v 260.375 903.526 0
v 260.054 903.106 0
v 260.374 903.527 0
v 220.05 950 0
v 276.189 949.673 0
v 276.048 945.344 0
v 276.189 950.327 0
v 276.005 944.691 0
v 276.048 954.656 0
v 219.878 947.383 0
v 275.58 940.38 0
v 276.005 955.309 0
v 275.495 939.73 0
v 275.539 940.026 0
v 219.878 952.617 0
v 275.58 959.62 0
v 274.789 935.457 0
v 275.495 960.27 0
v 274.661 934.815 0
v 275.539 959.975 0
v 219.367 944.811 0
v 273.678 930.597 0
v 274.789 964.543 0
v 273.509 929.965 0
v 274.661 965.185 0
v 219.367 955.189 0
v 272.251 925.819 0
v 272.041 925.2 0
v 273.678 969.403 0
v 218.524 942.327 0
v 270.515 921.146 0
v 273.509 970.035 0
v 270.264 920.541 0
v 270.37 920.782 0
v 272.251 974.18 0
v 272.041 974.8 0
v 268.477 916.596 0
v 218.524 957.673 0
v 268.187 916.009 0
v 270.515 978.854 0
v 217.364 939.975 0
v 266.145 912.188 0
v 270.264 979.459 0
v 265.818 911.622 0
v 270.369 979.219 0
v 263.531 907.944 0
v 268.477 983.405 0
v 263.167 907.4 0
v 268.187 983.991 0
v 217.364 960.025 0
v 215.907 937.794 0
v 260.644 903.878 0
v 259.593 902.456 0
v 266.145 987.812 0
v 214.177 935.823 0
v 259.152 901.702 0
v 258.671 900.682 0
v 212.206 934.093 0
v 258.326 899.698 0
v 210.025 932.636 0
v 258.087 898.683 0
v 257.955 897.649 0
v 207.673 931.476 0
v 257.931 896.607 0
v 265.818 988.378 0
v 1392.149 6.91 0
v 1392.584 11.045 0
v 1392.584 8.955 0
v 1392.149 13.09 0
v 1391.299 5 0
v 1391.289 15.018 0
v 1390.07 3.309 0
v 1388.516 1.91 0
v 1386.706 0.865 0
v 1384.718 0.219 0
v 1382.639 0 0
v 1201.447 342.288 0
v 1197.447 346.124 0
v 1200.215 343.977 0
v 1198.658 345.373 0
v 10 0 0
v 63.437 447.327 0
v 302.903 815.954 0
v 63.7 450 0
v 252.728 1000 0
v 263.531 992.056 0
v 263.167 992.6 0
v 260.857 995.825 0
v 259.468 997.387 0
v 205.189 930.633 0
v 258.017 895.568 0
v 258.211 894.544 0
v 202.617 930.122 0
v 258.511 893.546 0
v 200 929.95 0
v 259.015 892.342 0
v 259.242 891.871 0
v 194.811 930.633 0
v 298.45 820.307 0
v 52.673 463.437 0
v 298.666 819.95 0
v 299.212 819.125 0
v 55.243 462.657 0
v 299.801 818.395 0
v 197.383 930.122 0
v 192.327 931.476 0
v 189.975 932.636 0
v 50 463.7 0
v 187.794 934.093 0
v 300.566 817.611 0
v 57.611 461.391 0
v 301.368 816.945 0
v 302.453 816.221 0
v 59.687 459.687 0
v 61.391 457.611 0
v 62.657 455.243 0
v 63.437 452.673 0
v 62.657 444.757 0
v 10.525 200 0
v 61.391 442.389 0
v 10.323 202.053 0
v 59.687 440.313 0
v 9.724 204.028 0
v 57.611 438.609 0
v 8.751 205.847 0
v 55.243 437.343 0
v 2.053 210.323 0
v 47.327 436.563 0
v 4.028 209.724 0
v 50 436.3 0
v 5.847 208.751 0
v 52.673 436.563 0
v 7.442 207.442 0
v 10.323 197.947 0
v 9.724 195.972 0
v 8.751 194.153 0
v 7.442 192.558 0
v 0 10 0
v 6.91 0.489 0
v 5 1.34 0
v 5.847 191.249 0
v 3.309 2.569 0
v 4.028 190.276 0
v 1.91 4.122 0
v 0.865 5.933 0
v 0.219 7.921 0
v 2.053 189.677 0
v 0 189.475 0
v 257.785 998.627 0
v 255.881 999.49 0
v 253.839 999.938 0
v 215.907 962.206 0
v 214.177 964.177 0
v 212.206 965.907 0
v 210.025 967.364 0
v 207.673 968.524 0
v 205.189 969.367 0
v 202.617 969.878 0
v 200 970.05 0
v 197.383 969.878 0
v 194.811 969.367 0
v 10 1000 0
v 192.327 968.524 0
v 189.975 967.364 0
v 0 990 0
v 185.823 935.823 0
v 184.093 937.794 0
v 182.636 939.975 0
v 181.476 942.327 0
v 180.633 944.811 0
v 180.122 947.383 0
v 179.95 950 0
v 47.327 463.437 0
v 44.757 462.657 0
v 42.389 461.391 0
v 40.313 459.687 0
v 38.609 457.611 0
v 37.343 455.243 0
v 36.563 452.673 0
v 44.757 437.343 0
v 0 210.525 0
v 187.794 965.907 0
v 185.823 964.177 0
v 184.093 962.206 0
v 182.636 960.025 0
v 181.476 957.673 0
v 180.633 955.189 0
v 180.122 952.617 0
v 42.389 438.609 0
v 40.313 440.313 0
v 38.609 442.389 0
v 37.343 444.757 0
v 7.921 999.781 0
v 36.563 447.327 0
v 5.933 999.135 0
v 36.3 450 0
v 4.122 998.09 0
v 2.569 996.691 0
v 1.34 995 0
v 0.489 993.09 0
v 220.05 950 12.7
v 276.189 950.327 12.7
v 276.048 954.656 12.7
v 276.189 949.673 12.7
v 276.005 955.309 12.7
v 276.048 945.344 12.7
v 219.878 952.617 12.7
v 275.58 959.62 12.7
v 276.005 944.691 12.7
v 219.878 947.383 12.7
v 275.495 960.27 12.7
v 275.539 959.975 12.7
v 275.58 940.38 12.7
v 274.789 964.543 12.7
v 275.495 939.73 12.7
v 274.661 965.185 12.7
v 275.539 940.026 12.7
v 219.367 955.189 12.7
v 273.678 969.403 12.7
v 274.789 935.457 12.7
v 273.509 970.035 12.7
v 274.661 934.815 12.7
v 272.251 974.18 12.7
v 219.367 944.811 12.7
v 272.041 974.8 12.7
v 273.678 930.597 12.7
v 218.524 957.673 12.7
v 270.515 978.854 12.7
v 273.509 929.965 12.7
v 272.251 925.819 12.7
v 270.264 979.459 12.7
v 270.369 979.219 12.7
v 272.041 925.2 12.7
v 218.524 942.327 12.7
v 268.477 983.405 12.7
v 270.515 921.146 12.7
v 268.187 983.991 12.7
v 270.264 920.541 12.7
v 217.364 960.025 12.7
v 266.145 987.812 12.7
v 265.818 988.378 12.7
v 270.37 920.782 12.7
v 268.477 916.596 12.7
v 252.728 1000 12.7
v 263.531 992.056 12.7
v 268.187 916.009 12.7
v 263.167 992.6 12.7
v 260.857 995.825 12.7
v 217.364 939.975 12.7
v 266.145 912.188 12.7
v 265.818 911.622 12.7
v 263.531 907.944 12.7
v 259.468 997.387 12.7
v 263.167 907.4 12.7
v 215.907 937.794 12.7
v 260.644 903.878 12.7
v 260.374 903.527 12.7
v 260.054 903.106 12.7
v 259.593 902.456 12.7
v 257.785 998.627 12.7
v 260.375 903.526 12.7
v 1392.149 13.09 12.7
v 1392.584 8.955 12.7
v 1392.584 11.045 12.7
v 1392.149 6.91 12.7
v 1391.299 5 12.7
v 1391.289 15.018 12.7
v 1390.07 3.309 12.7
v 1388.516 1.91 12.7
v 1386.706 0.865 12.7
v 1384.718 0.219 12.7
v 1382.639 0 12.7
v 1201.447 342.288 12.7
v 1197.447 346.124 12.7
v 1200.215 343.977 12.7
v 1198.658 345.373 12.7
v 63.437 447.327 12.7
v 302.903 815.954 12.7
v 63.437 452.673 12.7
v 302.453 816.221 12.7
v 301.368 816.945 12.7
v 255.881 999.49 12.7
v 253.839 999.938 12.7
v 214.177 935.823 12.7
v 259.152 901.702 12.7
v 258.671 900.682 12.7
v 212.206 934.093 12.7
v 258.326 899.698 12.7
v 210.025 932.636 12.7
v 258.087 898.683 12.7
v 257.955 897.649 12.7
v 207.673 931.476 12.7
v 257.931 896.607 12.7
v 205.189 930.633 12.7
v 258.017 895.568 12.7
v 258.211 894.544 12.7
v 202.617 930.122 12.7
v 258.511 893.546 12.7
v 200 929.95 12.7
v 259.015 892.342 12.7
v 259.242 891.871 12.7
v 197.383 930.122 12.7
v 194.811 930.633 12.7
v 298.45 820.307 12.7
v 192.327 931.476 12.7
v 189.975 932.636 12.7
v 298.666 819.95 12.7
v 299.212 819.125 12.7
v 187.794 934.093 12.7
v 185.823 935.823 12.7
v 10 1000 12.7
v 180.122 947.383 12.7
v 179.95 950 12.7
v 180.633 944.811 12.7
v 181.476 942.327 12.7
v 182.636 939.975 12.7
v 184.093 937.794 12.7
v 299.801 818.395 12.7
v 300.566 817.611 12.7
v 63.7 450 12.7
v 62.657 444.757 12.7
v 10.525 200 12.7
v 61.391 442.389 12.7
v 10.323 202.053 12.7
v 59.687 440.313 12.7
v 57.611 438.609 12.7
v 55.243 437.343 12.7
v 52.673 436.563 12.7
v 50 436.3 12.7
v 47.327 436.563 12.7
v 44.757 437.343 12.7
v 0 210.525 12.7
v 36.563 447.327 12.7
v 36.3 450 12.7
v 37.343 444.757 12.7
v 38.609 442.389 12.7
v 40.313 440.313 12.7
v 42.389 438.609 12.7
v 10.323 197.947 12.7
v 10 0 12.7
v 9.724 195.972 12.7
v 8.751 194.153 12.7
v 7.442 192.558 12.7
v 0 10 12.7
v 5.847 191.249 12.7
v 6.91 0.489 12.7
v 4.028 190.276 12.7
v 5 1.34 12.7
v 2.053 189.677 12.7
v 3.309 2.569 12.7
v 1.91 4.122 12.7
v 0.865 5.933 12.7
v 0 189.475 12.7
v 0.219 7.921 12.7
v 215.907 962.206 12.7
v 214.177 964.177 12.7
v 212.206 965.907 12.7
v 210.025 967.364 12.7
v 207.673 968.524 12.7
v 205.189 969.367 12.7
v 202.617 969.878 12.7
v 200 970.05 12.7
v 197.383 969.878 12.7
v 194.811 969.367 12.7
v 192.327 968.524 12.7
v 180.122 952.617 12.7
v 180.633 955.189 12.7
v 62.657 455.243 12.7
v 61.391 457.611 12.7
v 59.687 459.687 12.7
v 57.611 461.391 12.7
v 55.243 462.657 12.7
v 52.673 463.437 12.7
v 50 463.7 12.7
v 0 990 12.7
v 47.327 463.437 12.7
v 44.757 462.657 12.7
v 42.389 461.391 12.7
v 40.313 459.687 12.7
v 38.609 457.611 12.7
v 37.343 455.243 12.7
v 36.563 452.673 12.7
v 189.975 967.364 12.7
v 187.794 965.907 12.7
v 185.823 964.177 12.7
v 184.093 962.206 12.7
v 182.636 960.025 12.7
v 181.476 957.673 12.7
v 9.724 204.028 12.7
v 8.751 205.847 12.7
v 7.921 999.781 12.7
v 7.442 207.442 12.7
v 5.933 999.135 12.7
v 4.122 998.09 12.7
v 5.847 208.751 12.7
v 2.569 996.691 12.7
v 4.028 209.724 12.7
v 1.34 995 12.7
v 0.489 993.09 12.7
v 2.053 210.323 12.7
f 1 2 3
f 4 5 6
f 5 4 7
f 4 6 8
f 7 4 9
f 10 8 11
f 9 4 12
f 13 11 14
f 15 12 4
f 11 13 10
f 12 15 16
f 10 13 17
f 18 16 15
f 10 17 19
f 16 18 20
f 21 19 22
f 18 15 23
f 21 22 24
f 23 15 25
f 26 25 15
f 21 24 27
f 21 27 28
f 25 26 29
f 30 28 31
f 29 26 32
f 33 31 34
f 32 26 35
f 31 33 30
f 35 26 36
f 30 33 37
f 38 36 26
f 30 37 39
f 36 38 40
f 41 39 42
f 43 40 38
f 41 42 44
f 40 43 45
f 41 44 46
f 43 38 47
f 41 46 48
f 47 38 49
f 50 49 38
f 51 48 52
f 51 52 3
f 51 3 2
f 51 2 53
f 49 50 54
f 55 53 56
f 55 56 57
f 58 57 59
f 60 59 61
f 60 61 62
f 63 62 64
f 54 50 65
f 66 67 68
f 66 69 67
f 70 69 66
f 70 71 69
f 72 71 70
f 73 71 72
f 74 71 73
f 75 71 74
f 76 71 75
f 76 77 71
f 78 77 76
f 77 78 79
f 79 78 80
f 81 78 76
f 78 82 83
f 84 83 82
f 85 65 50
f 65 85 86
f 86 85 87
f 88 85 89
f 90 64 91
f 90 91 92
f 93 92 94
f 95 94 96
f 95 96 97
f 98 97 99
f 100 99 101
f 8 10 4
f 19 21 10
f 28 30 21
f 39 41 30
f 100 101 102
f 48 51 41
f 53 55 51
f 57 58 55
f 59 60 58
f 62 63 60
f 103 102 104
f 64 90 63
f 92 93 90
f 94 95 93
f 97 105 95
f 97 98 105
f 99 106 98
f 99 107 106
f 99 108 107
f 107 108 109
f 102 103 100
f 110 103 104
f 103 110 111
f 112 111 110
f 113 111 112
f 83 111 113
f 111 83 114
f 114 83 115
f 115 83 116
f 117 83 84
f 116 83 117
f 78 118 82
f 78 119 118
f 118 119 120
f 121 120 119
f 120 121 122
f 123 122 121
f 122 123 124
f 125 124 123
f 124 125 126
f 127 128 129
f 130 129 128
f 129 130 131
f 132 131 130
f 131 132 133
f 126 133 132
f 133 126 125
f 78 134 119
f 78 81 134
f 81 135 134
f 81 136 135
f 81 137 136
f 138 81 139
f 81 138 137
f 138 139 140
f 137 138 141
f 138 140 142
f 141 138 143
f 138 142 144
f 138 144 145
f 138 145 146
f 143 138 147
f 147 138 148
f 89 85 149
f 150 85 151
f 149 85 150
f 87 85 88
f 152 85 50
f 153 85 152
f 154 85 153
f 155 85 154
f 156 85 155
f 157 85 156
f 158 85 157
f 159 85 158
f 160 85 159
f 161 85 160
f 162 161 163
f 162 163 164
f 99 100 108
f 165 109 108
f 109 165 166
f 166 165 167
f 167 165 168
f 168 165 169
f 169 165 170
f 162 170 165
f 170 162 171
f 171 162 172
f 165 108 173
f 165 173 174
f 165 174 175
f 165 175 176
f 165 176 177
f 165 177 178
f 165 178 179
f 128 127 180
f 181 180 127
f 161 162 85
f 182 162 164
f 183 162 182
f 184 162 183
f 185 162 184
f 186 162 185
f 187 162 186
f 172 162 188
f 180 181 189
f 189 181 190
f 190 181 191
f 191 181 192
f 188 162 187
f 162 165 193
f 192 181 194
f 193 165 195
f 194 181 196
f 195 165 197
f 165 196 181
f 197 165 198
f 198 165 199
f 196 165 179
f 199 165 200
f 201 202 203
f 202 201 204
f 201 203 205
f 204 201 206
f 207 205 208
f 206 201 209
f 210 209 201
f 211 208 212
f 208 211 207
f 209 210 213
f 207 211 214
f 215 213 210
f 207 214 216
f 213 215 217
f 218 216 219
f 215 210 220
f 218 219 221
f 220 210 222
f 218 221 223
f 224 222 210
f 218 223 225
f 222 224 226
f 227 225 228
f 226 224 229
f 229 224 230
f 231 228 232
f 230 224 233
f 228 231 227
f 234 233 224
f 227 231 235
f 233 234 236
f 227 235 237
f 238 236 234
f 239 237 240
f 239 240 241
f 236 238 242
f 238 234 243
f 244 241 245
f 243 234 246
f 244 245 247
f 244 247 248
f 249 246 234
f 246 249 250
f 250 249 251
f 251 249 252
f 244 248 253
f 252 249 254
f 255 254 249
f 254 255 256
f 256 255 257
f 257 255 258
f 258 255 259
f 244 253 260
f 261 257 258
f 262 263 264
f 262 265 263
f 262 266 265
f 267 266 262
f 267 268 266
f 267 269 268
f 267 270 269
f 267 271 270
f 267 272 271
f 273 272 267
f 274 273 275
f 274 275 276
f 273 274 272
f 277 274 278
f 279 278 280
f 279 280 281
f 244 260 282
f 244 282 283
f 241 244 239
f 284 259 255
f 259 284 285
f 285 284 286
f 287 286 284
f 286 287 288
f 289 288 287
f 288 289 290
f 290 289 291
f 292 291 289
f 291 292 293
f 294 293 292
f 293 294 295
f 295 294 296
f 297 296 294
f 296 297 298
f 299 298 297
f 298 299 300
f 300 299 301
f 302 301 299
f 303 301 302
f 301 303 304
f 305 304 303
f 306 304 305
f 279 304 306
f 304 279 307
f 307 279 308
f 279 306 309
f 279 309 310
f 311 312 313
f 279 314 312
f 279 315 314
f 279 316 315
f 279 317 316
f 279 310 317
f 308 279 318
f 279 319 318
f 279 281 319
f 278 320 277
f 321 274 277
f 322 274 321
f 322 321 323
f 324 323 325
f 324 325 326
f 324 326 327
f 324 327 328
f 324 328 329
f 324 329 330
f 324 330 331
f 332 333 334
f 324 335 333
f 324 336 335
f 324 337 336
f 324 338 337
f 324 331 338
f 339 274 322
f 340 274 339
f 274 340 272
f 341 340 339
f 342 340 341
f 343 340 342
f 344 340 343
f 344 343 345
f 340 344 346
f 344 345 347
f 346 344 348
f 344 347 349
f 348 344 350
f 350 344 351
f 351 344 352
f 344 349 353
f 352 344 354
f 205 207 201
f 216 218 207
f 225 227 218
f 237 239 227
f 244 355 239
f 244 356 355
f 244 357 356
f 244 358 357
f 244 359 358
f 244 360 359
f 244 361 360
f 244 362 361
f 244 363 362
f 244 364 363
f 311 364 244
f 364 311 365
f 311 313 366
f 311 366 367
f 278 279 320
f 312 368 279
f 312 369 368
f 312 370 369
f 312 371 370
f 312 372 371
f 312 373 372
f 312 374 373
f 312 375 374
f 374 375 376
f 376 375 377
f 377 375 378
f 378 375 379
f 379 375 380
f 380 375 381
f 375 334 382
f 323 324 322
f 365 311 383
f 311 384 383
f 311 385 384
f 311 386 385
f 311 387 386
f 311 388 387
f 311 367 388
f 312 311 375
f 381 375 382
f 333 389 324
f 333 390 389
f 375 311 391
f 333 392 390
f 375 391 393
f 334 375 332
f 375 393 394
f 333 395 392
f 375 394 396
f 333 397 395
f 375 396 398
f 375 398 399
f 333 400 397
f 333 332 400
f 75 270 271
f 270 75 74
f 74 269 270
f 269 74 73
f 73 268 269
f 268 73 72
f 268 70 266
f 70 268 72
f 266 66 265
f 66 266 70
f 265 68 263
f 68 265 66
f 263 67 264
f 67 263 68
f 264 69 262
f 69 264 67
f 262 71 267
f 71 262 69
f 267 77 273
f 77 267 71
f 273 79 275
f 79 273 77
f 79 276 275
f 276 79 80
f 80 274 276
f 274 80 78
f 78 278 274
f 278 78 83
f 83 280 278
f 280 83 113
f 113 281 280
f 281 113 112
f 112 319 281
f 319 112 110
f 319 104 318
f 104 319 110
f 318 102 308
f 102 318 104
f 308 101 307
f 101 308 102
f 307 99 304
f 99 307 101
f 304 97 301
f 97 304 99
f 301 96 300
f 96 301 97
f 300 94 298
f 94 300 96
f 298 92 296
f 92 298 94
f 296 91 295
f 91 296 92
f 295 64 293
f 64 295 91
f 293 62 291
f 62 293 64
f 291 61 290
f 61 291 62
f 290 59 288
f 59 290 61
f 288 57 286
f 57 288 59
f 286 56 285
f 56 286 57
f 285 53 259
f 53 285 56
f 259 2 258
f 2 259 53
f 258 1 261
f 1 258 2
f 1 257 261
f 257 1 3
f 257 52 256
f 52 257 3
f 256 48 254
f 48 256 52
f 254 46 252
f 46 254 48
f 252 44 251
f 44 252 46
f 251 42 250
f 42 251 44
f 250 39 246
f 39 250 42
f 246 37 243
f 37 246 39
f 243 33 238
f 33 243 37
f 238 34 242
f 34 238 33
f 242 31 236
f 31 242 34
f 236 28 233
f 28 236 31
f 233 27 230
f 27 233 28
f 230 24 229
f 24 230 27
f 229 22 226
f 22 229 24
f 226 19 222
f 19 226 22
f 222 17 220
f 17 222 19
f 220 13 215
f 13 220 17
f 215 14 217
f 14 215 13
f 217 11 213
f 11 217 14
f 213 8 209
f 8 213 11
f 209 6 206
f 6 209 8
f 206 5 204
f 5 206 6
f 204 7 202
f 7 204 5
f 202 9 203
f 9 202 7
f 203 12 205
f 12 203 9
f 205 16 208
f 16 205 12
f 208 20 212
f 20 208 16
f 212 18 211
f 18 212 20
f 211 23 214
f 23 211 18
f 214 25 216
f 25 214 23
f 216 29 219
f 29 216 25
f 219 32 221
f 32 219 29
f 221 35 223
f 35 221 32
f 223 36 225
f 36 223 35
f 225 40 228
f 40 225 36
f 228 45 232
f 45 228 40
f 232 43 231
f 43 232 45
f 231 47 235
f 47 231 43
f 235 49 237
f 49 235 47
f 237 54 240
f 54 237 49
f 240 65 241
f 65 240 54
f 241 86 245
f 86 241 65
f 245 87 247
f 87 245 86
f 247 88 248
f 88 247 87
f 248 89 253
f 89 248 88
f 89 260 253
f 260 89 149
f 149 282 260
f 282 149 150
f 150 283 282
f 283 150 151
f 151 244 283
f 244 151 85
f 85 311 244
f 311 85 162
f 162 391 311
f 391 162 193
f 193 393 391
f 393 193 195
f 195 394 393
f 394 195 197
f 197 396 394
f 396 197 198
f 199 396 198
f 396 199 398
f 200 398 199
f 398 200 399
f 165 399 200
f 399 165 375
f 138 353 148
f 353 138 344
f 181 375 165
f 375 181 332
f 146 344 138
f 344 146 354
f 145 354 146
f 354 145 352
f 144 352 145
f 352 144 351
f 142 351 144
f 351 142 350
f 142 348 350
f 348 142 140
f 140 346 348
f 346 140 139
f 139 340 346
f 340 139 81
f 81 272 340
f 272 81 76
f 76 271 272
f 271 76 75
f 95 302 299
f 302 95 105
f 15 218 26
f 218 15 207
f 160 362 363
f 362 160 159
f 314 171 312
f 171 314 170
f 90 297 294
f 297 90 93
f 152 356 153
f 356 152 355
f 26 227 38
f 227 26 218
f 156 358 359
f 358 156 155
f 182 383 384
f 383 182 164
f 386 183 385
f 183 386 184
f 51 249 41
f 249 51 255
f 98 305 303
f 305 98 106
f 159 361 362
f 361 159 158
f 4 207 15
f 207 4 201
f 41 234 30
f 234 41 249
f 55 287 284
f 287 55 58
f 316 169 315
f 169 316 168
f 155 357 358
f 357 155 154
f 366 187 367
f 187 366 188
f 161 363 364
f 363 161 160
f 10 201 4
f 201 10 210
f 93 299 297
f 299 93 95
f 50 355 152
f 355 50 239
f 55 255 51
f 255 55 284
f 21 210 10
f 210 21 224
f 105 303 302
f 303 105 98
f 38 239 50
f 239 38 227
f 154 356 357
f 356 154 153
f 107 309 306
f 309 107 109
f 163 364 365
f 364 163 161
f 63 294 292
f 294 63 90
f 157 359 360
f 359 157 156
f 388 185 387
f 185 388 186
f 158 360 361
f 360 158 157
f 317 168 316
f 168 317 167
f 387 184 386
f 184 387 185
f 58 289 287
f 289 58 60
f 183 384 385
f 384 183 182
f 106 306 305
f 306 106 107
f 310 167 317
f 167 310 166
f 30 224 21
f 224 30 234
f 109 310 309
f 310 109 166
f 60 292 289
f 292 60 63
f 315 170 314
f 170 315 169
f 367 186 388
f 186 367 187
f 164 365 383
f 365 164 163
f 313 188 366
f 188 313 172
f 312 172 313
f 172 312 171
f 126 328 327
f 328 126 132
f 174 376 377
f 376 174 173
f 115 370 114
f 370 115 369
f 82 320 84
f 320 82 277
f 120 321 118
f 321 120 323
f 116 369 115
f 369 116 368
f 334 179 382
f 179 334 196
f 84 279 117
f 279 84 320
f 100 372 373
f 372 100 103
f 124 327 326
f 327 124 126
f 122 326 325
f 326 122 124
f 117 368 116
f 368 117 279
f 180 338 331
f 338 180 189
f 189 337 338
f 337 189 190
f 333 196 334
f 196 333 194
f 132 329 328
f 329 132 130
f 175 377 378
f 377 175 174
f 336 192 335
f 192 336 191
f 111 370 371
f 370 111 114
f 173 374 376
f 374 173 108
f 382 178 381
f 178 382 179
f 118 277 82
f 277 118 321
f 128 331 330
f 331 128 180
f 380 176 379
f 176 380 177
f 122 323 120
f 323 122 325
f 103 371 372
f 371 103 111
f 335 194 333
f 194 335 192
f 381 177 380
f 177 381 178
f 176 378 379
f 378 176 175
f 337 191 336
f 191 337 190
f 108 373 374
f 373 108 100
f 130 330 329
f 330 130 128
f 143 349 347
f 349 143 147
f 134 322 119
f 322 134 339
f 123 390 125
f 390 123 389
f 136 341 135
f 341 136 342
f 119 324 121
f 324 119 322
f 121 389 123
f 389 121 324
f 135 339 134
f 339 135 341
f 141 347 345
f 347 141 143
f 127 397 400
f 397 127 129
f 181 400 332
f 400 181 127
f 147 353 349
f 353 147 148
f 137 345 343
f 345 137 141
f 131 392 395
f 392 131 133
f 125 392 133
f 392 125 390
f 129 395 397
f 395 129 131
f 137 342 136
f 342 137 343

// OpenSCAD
// side_panel.scad
// Triangular side panel for LifeTrac v25
// This is the main structural plate that forms the sides of the machine
// Part of the "sandwich" design with 4 panels total (2 inner, 2 outer)

// Include necessary parameters from main assembly
include <../lifetrac_v25_params.scad>

// Triangular profile for side panels
// Tall end at rear (Y=0), shorter sloped end at front (Y=WHEEL_BASE)
module side_panel_profile() {
    // Calculate arm bottom slope line
    // Pivot point in panel coordinates
    pivot_y_panel = ARM_PIVOT_Y;
    pivot_z_panel = MACHINE_HEIGHT - 50;
    
    // Arm angle (ensure it's defined)
    arm_angle = is_undef(ARM_MIN_ANGLE) ? -45 : ARM_MIN_ANGLE;
    
    // Vertical offset to clear arm bottom (Half tube height + clearance)
    // Tube is 3" (76.2mm), half is 38.1mm. Add ~40mm clearance.
    arm_clearance_z = 80;
    
    // Function to calculate wall height at a given Y based on arm slope
    function wall_height(y) = 
        let(
            dy = y - pivot_y_panel,
            dz = dy * tan(arm_angle)
        )
        pivot_z_panel + dz - arm_clearance_z;

    // Define key Y coordinates
    y_rear = 0;
    y_pivot_start = pivot_y_panel - 100; // Start of pivot area
    y_pivot_end = pivot_y_panel + 100;   // End of pivot area (start of slope)
    y_front = WHEEL_BASE;                // Front of machine
    
    // Calculate Z heights
    z_pivot_end = wall_height(y_pivot_end);
    z_front_slope = wall_height(y_front - 200); // Point before final drop

    // The arm pivot pin pushes forward and up on this plate, toward the sloped edge.
    // The boss keeps 2 x the pin diameter of steel around the hole in that direction.
    // Above the hole, the top edge must be at least 1.25 x the pin diameter away
    // (the AISC minimum edge distance).
    assert(SIDE_PANEL_PIVOT_BOSS_R >= 2 * PIVOT_PIN_DIA,
           "SIDE_PANEL_PIVOT_BOSS_R must be at least 2 x PIVOT_PIN_DIA");
    assert(MACHINE_HEIGHT - pivot_z_panel >= 1.25 * PIVOT_PIN_DIA,
           "Arm pivot hole is too close to the top edge of the side panel");

    offset(r=10) offset(r=-10)  // Rounded corners
    offset(r=-10) offset(r=10)  // Fillets in the inside corners, e.g. where the boss meets the slope
    union() {
        polygon([
            [0, 0],                              // Rear bottom
            [WHEEL_BASE, 0],                     // Front bottom
            [WHEEL_BASE, 0],                     // Front top (drop to corner)
            [WHEEL_BASE - 200, z_front_slope],   // End of arm slope
            [y_pivot_end, z_pivot_end],          // Start of arm slope
            [pivot_y_panel, MACHINE_HEIGHT],     // Pivot high point
            [0, MACHINE_HEIGHT]                  // Rear top (full height)
        ]);

        // Pivot boss, trimmed to the top edge
        intersection() {
            translate([pivot_y_panel, pivot_z_panel])
                circle(r=SIDE_PANEL_PIVOT_BOSS_R, $fn=96);
            translate([pivot_y_panel - SIDE_PANEL_PIVOT_BOSS_R, 0])
                square([2 * SIDE_PANEL_PIVOT_BOSS_R, MACHINE_HEIGHT]);
        }
    }
}

// Arc slot cutout for cross beam clearance
// Creates an arc-shaped slot that allows the cross beam to rotate through
module cross_beam_arc_slot(beam_distance, slot_width) {
    // Pivot point in panel local coordinates
    pivot_x = PIVOT_PANEL_X;
    pivot_y = PIVOT_PANEL_Y;
    
    // Arc radius = distance from pivot to cross beam center
    arc_radius = beam_distance;
    
    // Half-width of the slot (beam size + clearance)
    half_slot = slot_width / 2;
    
    // Generate arc by rotating around pivot
    // The arc sweeps from ARM_MIN_ANGLE to ARM_MAX_ANGLE
    // We extend slightly beyond to ensure full clearance
    // Safety check for undefined angles
    safe_min_angle = is_undef(ARM_MIN_ANGLE) ? -45 : ARM_MIN_ANGLE;
    safe_max_angle = is_undef(ARM_MAX_ANGLE) ? 60 : ARM_MAX_ANGLE;
    
    arc_start = safe_min_angle - 5;
    arc_end = safe_max_angle + 5;
    arc_steps = 60;
    
    translate([pivot_x, pivot_y])
    for (i = [0:arc_steps-1]) {
        angle1 = arc_start + i * (arc_end - arc_start) / arc_steps;
        angle2 = arc_start + (i + 1) * (arc_end - arc_start) / arc_steps;
        
        // Inner and outer points for this arc segment
        hull() {
            // Point at angle1, inner radius
            translate([(arc_radius - half_slot) * cos(angle1), (arc_radius - half_slot) * sin(angle1)])
            circle(d=5, $fn=8);
            
            // Point at angle1, outer radius
            translate([(arc_radius + half_slot) * cos(angle1), (arc_radius + half_slot) * sin(angle1)])
            circle(d=5, $fn=8);
            
            // Point at angle2, inner radius
            translate([(arc_radius - half_slot) * cos(angle2), (arc_radius - half_slot) * sin(angle2)])
            circle(d=5, $fn=8);
            
            // Point at angle2, outer radius
            translate([(arc_radius + half_slot) * cos(angle2), (arc_radius + half_slot) * sin(angle2)])
            circle(d=5, $fn=8);
        }
    }
}

// Arc slot cutout for hydraulic bracket clearance
// Creates an arc-shaped divot with gusset profile that allows the arm's 
// hydraulic mounting extension to rotate through without collision
module hydraulic_bracket_arc_slot(bracket_pos, bracket_dia, clearance) {
    // Pivot point in panel local coordinates
    pivot_x = PIVOT_PANEL_X;
    pivot_y = PIVOT_PANEL_Y;
    
    // Bracket circle parameters
    circle_r = bracket_dia / 2;
    tube_h = is_undef(TUBE_2X6_1_4) ? 152.4 : TUBE_2X6_1_4[1];  // 6" tube height
    tube_w = is_undef(TUBE_2X6_1_4) ? 50.8 : TUBE_2X6_1_4[0];   // 2" tube width
    
    // Cutout depth - only 3" deep (not full bracket depth)
    cutout_depth = 76.2;  // 3 inches
    
    // Gusset attachment length (matching arm plate: 3x tube width)
    gusset_attach_len = tube_w * 3;
    
    // The cutout profile mirrors the arm plate extension but shallower
    // Circle center offset from arm axis (at tube bottom - cutout_depth/2)
    cutout_circle_r = cutout_depth / 2;
    
    // Offset perpendicular to arm axis (below the arm)
    perp_offset = tube_h/2 + cutout_circle_r;
    
    // Total cutout radius (half of cutout depth + clearance)
    cutout_r = cutout_circle_r + clearance;
    
    // Half of gusset attachment (for the triangular profile)
    gusset_half = gusset_attach_len / 2 + clearance;
    
    // Safety check for undefined angles
    safe_min_angle = is_undef(ARM_MIN_ANGLE) ? -45 : ARM_MIN_ANGLE;
    safe_max_angle = is_undef(ARM_MAX_ANGLE) ? 60 : ARM_MAX_ANGLE;
    
    // Arc sweep with buffer
    arc_start = safe_min_angle - 5;
    arc_end = safe_max_angle + 5;
    arc_steps = 40;
    
    // Generate arc slot with gusset profile by sweeping the shape along the arc path
    // The gusset rotates WITH the arm, so wide edge stays perpendicular to arm direction
    translate([pivot_x, pivot_y])
    for (i = [0:arc_steps-1]) {
        angle1 = arc_start + i * (arc_end - arc_start) / arc_steps;
        angle2 = arc_start + (i + 1) * (arc_end - arc_start) / arc_steps;
        
        hull() {
            // Profile at angle1 - rotates with arm
            rotate([0, 0, angle1]) {
                // Wide edge at tube bottom (along arm direction)
                translate([bracket_pos - gusset_half, -tube_h/2 - clearance])
                square([gusset_attach_len + 2*clearance, 1]);
                
                // Circle at bottom of gusset (perpendicular to arm, below it)
                translate([bracket_pos, -perp_offset])
                circle(r=cutout_r, $fn=24);
            }
            
            // Profile at angle2 - rotates with arm
            rotate([0, 0, angle2]) {
                // Wide edge at tube bottom
                translate([bracket_pos - gusset_half, -tube_h/2 - clearance])
                square([gusset_attach_len + 2*clearance, 1]);
                
                // Circle at bottom of gusset
                translate([bracket_pos, -perp_offset])
                circle(r=cutout_r, $fn=24);
            }
        }
    }
}

// Main side panel module with all features (holes, slots)
// is_inner: true for inner panels (with arc slots), false for outer panels
module side_panel(is_inner = false) {
    slot_width = CROSS_BEAM_SIZE + 2 * CROSS_BEAM_CLEARANCE;  // Total slot width with clearance
    
    // Hydraulic bracket parameters (with fallback defaults)
    hyd_bracket_pos = is_undef(HYD_BRACKET_ARM_POS) ? 300 : HYD_BRACKET_ARM_POS;
    hyd_bracket_dia = is_undef(HYD_BRACKET_CIRCLE_DIA) ? 76.2 : HYD_BRACKET_CIRCLE_DIA;
    hyd_bracket_clearance = is_undef(HYD_BRACKET_CUTOUT_CLEARANCE) ? 15 : HYD_BRACKET_CUTOUT_CLEARANCE;
    
    difference() {
        linear_extrude(height=PANEL_THICKNESS)
        difference() {
            side_panel_profile();
            
            // Cross beam arc slots (only on inner panels)
            if (is_inner) {
                // First cross beam slot (near pivot)
                cross_beam_arc_slot(CROSS_BEAM_1_POS, slot_width);
                
                // Second cross beam slot (near bucket) - only if it intersects the panel
                // The second beam is far forward and may not need a cutout
                // Check if any part of the arc passes through the panel
                if (CROSS_BEAM_2_POS < WHEEL_BASE + 200) {
                    cross_beam_arc_slot(CROSS_BEAM_2_POS, slot_width);
                }
                
                // Hydraulic bracket arc slot (inner panels only)
                // This prevents the bracket mounting bolts from colliding with the wall
                hydraulic_bracket_arc_slot(hyd_bracket_pos, hyd_bracket_dia, hyd_bracket_clearance);
            }
        }
        
        // Arm pivot hole near rear top (where the tall section is)
        // Position matches ARM_PIVOT_Y in world coordinates
        translate([ARM_PIVOT_Y, MACHINE_HEIGHT - 50, PANEL_THICKNESS/2])
        cylinder(d=PIVOT_PIN_DIA + 2, h=PANEL_THICKNESS+4, center=true, $fn=48);
        
        // Lift cylinder base mount hole (on both inner and outer panels)
        // Position matches LIFT_CYL_BASE_Y in world coordinates (Y=0 is rear)
        translate([LIFT_CYL_BASE_Y, LIFT_CYL_BASE_Z - FRAME_Z_OFFSET, PANEL_THICKNESS/2])
        cylinder(d=BOLT_DIA_1 + 2, h=PANEL_THICKNESS+4, center=true, $fn=32);
        
        // Wheel axle holes
        translate([0, WHEEL_DIAMETER/2 - 50, PANEL_THICKNESS/2])
        cylinder(d=BOLT_DIA_3_4 + 2, h=PANEL_THICKNESS+4, center=true, $fn=32);
        
        translate([WHEEL_BASE, WHEEL_DIAMETER/2 - 50, PANEL_THICKNESS/2])
        cylinder(d=BOLT_DIA_3_4 + 2, h=PANEL_THICKNESS+4, center=true, $fn=32);
        
        // =================================================================
        // FOLDING PLATFORM PIVOT HOLES (inner panels only)
        // =================================================================
        // These holes allow the platform pivot pin to pass through
        // Located near rear of panel, but clear of stiffener cutout zone
        // Stiffener cutout extends to X=31.75 in panel coords, so pivot must be beyond that
        // X position in panel coords = Y position in world coords
        // Y position in panel coords = Z position in world coords - FRAME_Z_OFFSET
        if (is_inner) {
            // Pivot Y position in world coords (clear of stiffener zone)
            pivot_world_y = PLATFORM_MOUNT_Y;  // Parametric forward position
            pivot_panel_x = pivot_world_y;  // Panel X = world Y
            pivot_panel_y = PLATFORM_PIVOT_HEIGHT - FRAME_Z_OFFSET;  // Panel Y = world Z - offset
            
            // Main pivot pin hole (1" + clearance)
            translate([pivot_panel_x, pivot_panel_y, PANEL_THICKNESS/2])
            cylinder(d=PLATFORM_PIVOT_PIN_DIA + PLATFORM_BOLT_CLEARANCE, 
                     h=PANEL_THICKNESS+4, center=true, $fn=48);
            
            // Deployed position lock pin hole (below pivot in Z = below in panel Y)
            translate([pivot_panel_x, pivot_panel_y - PLATFORM_LOCK_OFFSET, PANEL_THICKNESS/2])
            cylinder(d=PLATFORM_LOCK_PIN_DIA + PLATFORM_BOLT_CLEARANCE, 
                     h=PANEL_THICKNESS+4, center=true, $fn=32);
            
            // Stowed position lock pin hole (toward rear in Y = toward X=0 in panel)
            // When stowed, arm extends upward, lock pin aligns with arm end
            // This hole is at same Z as pivot but closer to rear
            stowed_lock_panel_x = pivot_panel_x - PLATFORM_ARM_LENGTH * 0.3;  // Offset toward rear
            if (stowed_lock_panel_x > 35) {  // Only if clear of stiffener cutout
                translate([stowed_lock_panel_x, pivot_panel_y + PLATFORM_ARM_LENGTH, PANEL_THICKNESS/2])
                cylinder(d=PLATFORM_LOCK_PIN_DIA + PLATFORM_BOLT_CLEARANCE, 
                         h=PANEL_THICKNESS+4, center=true, $fn=32);
            }
        }
    }
}

// Render the part for preview/export
if ($preview || len(search("side_panel.scad", parent_modules())) == 0) {
    side_panel(is_inner = false);  // Default to outer panel
}
